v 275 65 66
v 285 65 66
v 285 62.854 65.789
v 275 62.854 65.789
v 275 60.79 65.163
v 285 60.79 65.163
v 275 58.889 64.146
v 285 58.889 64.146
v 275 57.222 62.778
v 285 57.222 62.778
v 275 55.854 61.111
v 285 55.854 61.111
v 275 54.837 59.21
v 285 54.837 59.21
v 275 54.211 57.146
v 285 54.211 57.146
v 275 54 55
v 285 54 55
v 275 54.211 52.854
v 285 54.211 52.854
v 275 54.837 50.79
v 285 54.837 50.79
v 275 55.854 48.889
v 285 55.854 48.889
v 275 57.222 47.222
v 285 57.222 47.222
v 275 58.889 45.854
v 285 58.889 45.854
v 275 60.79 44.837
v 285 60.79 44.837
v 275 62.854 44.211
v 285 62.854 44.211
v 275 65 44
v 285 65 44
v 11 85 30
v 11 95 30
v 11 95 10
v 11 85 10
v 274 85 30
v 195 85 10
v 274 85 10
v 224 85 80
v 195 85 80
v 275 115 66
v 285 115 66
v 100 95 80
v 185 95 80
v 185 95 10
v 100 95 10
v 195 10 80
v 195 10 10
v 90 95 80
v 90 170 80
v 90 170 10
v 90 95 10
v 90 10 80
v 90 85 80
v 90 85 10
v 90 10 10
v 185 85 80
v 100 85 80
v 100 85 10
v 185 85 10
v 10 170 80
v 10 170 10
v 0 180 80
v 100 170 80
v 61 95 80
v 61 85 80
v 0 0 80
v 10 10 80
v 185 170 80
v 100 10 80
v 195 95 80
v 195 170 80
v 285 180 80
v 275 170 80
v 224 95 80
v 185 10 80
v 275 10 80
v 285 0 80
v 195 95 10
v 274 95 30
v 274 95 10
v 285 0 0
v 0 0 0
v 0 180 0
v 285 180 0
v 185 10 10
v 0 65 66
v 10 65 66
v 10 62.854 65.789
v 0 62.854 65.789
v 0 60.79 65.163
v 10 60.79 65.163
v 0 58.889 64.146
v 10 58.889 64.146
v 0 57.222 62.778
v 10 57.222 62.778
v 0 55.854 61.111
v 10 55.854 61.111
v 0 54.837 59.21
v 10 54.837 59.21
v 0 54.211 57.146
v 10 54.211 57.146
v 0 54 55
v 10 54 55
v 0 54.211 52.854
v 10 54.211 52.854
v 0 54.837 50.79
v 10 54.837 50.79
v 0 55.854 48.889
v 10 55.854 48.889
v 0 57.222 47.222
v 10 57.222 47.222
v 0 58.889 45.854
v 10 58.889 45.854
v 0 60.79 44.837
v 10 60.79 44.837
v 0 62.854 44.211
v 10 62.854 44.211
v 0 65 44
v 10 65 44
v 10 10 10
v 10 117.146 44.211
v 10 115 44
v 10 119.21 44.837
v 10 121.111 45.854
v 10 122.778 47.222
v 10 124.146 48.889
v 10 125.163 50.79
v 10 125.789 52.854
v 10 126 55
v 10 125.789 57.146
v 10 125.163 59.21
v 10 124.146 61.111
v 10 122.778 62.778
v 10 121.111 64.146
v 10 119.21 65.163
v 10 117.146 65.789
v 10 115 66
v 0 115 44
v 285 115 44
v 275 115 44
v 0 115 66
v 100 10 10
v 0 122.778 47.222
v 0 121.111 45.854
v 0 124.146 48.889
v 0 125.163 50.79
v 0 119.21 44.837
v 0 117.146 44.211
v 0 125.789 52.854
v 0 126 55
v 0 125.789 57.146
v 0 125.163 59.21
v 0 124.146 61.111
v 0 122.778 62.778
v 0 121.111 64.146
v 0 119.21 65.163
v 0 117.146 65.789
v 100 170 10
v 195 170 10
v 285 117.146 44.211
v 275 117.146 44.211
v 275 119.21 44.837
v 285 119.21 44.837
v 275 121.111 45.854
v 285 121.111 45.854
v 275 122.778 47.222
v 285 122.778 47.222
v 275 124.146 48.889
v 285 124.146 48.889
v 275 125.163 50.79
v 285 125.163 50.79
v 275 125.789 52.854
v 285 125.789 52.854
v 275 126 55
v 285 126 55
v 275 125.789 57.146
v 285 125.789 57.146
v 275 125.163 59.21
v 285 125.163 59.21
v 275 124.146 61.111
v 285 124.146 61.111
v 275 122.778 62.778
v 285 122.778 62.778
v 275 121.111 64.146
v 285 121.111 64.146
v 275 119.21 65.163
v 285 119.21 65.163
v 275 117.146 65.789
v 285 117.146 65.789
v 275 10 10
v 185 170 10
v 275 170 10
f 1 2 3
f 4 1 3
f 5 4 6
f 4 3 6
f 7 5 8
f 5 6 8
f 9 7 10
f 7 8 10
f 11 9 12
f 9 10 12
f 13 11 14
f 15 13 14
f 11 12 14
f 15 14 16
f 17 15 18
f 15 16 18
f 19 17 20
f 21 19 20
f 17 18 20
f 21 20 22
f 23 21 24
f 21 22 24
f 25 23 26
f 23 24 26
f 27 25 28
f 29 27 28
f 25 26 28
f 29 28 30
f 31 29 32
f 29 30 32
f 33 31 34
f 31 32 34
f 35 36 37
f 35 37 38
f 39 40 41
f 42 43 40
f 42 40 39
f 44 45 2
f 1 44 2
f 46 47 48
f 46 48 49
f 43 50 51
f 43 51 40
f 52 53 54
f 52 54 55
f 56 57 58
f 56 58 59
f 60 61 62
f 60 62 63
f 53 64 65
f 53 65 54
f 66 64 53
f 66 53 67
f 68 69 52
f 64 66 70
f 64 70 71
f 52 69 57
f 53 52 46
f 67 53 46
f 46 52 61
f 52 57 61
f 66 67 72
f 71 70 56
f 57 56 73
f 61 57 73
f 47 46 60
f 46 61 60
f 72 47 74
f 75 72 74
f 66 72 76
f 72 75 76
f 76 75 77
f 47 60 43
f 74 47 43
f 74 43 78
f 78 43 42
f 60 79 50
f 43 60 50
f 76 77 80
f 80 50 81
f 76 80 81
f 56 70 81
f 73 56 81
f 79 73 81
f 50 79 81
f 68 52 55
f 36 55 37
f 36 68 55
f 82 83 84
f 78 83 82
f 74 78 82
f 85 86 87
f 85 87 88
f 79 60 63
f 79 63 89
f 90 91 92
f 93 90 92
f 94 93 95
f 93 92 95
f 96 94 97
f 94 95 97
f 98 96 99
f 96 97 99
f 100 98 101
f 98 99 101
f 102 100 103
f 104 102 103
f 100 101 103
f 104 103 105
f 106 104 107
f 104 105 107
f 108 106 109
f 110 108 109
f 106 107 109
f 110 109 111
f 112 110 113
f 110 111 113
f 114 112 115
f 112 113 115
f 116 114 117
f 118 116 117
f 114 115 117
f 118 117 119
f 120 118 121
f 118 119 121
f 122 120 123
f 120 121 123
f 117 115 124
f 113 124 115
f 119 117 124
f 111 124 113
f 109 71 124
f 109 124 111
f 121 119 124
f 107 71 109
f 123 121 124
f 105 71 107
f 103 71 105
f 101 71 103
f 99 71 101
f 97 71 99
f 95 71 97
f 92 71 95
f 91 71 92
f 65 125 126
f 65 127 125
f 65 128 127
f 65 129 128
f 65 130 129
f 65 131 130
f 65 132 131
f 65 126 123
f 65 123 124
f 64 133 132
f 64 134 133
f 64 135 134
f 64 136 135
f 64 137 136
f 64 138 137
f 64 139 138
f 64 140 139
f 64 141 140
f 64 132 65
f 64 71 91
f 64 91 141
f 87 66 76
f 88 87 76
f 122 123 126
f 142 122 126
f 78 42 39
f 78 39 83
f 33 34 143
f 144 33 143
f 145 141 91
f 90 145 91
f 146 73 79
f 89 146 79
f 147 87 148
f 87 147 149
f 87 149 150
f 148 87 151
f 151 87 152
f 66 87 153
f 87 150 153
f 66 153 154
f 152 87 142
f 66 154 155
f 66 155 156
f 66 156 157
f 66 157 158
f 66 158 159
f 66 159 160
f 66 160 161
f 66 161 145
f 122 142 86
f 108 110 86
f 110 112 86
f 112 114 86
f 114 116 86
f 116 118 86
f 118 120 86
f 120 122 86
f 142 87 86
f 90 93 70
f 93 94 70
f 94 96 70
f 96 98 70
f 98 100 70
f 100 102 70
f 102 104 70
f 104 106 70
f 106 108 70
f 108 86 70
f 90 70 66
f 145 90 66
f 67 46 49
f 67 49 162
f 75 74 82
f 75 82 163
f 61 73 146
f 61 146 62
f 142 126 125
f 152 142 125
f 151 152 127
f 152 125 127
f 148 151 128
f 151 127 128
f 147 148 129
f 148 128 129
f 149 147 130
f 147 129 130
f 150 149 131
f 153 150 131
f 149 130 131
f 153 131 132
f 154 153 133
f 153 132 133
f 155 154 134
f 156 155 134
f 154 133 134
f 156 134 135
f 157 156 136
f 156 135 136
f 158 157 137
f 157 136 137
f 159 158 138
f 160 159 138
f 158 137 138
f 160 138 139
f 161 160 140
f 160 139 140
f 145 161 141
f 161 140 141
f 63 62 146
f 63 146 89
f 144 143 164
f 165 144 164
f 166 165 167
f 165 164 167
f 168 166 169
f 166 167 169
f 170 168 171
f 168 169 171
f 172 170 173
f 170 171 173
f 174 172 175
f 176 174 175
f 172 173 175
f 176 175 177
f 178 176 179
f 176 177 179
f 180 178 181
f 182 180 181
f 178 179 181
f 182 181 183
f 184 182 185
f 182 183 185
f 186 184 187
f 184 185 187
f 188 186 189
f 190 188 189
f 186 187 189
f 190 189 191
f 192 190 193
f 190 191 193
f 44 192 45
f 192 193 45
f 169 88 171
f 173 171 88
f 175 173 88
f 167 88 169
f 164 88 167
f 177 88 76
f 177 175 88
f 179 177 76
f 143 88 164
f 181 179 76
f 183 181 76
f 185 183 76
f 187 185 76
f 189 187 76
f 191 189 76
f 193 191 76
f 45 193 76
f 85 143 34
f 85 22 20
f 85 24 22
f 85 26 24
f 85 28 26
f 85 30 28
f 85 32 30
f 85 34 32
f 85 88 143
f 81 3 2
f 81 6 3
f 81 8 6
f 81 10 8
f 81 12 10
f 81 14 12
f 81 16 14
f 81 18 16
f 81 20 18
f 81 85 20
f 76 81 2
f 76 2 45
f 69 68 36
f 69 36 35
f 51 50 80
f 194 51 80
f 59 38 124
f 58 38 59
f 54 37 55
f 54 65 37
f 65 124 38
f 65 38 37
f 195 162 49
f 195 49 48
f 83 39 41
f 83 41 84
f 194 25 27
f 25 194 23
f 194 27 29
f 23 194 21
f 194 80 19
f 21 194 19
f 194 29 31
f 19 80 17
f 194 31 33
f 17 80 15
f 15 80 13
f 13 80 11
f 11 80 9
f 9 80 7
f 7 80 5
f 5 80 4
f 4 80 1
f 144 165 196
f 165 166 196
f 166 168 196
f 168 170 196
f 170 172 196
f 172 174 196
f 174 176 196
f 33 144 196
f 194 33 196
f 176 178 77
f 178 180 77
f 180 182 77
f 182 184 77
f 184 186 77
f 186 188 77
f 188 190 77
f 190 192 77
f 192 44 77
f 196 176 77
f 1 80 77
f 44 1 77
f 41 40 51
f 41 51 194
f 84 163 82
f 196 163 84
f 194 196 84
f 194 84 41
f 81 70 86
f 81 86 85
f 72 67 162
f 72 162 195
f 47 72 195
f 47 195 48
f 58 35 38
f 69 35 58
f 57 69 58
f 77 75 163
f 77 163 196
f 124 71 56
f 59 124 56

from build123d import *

# Parameters (mm, degrees)
F0_W     = 285
F0_H     = 80
F1_DEPTH = 180
F2_W     = 265
F2_H     = 160
F3_DEPTH = 70
F5_DEPTH = 285.001
F7_DEPTH = 70
F8_SIZE2 = 50
F8_SIZE  = 50


with BuildPart() as f1:
    # F0 (on Front) → F1 (new body)
    with BuildSketch(Plane.XZ):
        with Locations((142.5, 40)):
            Rectangle(F0_W, F0_H)
    extrude(amount=-F1_DEPTH)

    # F2 (on face) → F3 (cut)
    with BuildSketch(Plane.XY.offset(80)):
        with Locations((142.5, 90)):
            Rectangle(F2_W, F2_H)
    extrude(amount=-F3_DEPTH, mode=Mode.SUBTRACT)

    # F4 (on face) → F5 (cut, through all)
    with BuildSketch(Plane.YZ.offset(285)):
        with BuildLine():
            Line((115, 66), (65, 66))
            ThreePointArc((65, 66), (54, 55), (65, 44))
            Line((65, 44), (115, 44))
            ThreePointArc((115, 44), (126, 55), (115, 66))
        make_face()
    extrude(amount=-F5_DEPTH, mode=Mode.SUBTRACT)

    # F6 (on face) → F7 (join)
    with BuildSketch(Plane.XY.offset(80)):
        Polygon((100, 170), (90, 170), (90, 95), (11, 95), (11, 85), (90, 85), (90, 10), (100, 10), (100, 85), (185, 85), (185, 10), (195, 10), (195, 85), (274, 85), (274, 95), (195, 95), (195, 170), (185, 170), (185, 95), (100, 95), align=None)
    extrude(amount=-F7_DEPTH)

    # F8
    f8_edges = [f1.edges().sort_by_distance(p)[0] for p in [
        (11, 90, 80),
        (274, 90, 80),
    ]]
    chamfer(f8_edges, length=F8_SIZE, length2=F8_SIZE2)


solid = f1.part
